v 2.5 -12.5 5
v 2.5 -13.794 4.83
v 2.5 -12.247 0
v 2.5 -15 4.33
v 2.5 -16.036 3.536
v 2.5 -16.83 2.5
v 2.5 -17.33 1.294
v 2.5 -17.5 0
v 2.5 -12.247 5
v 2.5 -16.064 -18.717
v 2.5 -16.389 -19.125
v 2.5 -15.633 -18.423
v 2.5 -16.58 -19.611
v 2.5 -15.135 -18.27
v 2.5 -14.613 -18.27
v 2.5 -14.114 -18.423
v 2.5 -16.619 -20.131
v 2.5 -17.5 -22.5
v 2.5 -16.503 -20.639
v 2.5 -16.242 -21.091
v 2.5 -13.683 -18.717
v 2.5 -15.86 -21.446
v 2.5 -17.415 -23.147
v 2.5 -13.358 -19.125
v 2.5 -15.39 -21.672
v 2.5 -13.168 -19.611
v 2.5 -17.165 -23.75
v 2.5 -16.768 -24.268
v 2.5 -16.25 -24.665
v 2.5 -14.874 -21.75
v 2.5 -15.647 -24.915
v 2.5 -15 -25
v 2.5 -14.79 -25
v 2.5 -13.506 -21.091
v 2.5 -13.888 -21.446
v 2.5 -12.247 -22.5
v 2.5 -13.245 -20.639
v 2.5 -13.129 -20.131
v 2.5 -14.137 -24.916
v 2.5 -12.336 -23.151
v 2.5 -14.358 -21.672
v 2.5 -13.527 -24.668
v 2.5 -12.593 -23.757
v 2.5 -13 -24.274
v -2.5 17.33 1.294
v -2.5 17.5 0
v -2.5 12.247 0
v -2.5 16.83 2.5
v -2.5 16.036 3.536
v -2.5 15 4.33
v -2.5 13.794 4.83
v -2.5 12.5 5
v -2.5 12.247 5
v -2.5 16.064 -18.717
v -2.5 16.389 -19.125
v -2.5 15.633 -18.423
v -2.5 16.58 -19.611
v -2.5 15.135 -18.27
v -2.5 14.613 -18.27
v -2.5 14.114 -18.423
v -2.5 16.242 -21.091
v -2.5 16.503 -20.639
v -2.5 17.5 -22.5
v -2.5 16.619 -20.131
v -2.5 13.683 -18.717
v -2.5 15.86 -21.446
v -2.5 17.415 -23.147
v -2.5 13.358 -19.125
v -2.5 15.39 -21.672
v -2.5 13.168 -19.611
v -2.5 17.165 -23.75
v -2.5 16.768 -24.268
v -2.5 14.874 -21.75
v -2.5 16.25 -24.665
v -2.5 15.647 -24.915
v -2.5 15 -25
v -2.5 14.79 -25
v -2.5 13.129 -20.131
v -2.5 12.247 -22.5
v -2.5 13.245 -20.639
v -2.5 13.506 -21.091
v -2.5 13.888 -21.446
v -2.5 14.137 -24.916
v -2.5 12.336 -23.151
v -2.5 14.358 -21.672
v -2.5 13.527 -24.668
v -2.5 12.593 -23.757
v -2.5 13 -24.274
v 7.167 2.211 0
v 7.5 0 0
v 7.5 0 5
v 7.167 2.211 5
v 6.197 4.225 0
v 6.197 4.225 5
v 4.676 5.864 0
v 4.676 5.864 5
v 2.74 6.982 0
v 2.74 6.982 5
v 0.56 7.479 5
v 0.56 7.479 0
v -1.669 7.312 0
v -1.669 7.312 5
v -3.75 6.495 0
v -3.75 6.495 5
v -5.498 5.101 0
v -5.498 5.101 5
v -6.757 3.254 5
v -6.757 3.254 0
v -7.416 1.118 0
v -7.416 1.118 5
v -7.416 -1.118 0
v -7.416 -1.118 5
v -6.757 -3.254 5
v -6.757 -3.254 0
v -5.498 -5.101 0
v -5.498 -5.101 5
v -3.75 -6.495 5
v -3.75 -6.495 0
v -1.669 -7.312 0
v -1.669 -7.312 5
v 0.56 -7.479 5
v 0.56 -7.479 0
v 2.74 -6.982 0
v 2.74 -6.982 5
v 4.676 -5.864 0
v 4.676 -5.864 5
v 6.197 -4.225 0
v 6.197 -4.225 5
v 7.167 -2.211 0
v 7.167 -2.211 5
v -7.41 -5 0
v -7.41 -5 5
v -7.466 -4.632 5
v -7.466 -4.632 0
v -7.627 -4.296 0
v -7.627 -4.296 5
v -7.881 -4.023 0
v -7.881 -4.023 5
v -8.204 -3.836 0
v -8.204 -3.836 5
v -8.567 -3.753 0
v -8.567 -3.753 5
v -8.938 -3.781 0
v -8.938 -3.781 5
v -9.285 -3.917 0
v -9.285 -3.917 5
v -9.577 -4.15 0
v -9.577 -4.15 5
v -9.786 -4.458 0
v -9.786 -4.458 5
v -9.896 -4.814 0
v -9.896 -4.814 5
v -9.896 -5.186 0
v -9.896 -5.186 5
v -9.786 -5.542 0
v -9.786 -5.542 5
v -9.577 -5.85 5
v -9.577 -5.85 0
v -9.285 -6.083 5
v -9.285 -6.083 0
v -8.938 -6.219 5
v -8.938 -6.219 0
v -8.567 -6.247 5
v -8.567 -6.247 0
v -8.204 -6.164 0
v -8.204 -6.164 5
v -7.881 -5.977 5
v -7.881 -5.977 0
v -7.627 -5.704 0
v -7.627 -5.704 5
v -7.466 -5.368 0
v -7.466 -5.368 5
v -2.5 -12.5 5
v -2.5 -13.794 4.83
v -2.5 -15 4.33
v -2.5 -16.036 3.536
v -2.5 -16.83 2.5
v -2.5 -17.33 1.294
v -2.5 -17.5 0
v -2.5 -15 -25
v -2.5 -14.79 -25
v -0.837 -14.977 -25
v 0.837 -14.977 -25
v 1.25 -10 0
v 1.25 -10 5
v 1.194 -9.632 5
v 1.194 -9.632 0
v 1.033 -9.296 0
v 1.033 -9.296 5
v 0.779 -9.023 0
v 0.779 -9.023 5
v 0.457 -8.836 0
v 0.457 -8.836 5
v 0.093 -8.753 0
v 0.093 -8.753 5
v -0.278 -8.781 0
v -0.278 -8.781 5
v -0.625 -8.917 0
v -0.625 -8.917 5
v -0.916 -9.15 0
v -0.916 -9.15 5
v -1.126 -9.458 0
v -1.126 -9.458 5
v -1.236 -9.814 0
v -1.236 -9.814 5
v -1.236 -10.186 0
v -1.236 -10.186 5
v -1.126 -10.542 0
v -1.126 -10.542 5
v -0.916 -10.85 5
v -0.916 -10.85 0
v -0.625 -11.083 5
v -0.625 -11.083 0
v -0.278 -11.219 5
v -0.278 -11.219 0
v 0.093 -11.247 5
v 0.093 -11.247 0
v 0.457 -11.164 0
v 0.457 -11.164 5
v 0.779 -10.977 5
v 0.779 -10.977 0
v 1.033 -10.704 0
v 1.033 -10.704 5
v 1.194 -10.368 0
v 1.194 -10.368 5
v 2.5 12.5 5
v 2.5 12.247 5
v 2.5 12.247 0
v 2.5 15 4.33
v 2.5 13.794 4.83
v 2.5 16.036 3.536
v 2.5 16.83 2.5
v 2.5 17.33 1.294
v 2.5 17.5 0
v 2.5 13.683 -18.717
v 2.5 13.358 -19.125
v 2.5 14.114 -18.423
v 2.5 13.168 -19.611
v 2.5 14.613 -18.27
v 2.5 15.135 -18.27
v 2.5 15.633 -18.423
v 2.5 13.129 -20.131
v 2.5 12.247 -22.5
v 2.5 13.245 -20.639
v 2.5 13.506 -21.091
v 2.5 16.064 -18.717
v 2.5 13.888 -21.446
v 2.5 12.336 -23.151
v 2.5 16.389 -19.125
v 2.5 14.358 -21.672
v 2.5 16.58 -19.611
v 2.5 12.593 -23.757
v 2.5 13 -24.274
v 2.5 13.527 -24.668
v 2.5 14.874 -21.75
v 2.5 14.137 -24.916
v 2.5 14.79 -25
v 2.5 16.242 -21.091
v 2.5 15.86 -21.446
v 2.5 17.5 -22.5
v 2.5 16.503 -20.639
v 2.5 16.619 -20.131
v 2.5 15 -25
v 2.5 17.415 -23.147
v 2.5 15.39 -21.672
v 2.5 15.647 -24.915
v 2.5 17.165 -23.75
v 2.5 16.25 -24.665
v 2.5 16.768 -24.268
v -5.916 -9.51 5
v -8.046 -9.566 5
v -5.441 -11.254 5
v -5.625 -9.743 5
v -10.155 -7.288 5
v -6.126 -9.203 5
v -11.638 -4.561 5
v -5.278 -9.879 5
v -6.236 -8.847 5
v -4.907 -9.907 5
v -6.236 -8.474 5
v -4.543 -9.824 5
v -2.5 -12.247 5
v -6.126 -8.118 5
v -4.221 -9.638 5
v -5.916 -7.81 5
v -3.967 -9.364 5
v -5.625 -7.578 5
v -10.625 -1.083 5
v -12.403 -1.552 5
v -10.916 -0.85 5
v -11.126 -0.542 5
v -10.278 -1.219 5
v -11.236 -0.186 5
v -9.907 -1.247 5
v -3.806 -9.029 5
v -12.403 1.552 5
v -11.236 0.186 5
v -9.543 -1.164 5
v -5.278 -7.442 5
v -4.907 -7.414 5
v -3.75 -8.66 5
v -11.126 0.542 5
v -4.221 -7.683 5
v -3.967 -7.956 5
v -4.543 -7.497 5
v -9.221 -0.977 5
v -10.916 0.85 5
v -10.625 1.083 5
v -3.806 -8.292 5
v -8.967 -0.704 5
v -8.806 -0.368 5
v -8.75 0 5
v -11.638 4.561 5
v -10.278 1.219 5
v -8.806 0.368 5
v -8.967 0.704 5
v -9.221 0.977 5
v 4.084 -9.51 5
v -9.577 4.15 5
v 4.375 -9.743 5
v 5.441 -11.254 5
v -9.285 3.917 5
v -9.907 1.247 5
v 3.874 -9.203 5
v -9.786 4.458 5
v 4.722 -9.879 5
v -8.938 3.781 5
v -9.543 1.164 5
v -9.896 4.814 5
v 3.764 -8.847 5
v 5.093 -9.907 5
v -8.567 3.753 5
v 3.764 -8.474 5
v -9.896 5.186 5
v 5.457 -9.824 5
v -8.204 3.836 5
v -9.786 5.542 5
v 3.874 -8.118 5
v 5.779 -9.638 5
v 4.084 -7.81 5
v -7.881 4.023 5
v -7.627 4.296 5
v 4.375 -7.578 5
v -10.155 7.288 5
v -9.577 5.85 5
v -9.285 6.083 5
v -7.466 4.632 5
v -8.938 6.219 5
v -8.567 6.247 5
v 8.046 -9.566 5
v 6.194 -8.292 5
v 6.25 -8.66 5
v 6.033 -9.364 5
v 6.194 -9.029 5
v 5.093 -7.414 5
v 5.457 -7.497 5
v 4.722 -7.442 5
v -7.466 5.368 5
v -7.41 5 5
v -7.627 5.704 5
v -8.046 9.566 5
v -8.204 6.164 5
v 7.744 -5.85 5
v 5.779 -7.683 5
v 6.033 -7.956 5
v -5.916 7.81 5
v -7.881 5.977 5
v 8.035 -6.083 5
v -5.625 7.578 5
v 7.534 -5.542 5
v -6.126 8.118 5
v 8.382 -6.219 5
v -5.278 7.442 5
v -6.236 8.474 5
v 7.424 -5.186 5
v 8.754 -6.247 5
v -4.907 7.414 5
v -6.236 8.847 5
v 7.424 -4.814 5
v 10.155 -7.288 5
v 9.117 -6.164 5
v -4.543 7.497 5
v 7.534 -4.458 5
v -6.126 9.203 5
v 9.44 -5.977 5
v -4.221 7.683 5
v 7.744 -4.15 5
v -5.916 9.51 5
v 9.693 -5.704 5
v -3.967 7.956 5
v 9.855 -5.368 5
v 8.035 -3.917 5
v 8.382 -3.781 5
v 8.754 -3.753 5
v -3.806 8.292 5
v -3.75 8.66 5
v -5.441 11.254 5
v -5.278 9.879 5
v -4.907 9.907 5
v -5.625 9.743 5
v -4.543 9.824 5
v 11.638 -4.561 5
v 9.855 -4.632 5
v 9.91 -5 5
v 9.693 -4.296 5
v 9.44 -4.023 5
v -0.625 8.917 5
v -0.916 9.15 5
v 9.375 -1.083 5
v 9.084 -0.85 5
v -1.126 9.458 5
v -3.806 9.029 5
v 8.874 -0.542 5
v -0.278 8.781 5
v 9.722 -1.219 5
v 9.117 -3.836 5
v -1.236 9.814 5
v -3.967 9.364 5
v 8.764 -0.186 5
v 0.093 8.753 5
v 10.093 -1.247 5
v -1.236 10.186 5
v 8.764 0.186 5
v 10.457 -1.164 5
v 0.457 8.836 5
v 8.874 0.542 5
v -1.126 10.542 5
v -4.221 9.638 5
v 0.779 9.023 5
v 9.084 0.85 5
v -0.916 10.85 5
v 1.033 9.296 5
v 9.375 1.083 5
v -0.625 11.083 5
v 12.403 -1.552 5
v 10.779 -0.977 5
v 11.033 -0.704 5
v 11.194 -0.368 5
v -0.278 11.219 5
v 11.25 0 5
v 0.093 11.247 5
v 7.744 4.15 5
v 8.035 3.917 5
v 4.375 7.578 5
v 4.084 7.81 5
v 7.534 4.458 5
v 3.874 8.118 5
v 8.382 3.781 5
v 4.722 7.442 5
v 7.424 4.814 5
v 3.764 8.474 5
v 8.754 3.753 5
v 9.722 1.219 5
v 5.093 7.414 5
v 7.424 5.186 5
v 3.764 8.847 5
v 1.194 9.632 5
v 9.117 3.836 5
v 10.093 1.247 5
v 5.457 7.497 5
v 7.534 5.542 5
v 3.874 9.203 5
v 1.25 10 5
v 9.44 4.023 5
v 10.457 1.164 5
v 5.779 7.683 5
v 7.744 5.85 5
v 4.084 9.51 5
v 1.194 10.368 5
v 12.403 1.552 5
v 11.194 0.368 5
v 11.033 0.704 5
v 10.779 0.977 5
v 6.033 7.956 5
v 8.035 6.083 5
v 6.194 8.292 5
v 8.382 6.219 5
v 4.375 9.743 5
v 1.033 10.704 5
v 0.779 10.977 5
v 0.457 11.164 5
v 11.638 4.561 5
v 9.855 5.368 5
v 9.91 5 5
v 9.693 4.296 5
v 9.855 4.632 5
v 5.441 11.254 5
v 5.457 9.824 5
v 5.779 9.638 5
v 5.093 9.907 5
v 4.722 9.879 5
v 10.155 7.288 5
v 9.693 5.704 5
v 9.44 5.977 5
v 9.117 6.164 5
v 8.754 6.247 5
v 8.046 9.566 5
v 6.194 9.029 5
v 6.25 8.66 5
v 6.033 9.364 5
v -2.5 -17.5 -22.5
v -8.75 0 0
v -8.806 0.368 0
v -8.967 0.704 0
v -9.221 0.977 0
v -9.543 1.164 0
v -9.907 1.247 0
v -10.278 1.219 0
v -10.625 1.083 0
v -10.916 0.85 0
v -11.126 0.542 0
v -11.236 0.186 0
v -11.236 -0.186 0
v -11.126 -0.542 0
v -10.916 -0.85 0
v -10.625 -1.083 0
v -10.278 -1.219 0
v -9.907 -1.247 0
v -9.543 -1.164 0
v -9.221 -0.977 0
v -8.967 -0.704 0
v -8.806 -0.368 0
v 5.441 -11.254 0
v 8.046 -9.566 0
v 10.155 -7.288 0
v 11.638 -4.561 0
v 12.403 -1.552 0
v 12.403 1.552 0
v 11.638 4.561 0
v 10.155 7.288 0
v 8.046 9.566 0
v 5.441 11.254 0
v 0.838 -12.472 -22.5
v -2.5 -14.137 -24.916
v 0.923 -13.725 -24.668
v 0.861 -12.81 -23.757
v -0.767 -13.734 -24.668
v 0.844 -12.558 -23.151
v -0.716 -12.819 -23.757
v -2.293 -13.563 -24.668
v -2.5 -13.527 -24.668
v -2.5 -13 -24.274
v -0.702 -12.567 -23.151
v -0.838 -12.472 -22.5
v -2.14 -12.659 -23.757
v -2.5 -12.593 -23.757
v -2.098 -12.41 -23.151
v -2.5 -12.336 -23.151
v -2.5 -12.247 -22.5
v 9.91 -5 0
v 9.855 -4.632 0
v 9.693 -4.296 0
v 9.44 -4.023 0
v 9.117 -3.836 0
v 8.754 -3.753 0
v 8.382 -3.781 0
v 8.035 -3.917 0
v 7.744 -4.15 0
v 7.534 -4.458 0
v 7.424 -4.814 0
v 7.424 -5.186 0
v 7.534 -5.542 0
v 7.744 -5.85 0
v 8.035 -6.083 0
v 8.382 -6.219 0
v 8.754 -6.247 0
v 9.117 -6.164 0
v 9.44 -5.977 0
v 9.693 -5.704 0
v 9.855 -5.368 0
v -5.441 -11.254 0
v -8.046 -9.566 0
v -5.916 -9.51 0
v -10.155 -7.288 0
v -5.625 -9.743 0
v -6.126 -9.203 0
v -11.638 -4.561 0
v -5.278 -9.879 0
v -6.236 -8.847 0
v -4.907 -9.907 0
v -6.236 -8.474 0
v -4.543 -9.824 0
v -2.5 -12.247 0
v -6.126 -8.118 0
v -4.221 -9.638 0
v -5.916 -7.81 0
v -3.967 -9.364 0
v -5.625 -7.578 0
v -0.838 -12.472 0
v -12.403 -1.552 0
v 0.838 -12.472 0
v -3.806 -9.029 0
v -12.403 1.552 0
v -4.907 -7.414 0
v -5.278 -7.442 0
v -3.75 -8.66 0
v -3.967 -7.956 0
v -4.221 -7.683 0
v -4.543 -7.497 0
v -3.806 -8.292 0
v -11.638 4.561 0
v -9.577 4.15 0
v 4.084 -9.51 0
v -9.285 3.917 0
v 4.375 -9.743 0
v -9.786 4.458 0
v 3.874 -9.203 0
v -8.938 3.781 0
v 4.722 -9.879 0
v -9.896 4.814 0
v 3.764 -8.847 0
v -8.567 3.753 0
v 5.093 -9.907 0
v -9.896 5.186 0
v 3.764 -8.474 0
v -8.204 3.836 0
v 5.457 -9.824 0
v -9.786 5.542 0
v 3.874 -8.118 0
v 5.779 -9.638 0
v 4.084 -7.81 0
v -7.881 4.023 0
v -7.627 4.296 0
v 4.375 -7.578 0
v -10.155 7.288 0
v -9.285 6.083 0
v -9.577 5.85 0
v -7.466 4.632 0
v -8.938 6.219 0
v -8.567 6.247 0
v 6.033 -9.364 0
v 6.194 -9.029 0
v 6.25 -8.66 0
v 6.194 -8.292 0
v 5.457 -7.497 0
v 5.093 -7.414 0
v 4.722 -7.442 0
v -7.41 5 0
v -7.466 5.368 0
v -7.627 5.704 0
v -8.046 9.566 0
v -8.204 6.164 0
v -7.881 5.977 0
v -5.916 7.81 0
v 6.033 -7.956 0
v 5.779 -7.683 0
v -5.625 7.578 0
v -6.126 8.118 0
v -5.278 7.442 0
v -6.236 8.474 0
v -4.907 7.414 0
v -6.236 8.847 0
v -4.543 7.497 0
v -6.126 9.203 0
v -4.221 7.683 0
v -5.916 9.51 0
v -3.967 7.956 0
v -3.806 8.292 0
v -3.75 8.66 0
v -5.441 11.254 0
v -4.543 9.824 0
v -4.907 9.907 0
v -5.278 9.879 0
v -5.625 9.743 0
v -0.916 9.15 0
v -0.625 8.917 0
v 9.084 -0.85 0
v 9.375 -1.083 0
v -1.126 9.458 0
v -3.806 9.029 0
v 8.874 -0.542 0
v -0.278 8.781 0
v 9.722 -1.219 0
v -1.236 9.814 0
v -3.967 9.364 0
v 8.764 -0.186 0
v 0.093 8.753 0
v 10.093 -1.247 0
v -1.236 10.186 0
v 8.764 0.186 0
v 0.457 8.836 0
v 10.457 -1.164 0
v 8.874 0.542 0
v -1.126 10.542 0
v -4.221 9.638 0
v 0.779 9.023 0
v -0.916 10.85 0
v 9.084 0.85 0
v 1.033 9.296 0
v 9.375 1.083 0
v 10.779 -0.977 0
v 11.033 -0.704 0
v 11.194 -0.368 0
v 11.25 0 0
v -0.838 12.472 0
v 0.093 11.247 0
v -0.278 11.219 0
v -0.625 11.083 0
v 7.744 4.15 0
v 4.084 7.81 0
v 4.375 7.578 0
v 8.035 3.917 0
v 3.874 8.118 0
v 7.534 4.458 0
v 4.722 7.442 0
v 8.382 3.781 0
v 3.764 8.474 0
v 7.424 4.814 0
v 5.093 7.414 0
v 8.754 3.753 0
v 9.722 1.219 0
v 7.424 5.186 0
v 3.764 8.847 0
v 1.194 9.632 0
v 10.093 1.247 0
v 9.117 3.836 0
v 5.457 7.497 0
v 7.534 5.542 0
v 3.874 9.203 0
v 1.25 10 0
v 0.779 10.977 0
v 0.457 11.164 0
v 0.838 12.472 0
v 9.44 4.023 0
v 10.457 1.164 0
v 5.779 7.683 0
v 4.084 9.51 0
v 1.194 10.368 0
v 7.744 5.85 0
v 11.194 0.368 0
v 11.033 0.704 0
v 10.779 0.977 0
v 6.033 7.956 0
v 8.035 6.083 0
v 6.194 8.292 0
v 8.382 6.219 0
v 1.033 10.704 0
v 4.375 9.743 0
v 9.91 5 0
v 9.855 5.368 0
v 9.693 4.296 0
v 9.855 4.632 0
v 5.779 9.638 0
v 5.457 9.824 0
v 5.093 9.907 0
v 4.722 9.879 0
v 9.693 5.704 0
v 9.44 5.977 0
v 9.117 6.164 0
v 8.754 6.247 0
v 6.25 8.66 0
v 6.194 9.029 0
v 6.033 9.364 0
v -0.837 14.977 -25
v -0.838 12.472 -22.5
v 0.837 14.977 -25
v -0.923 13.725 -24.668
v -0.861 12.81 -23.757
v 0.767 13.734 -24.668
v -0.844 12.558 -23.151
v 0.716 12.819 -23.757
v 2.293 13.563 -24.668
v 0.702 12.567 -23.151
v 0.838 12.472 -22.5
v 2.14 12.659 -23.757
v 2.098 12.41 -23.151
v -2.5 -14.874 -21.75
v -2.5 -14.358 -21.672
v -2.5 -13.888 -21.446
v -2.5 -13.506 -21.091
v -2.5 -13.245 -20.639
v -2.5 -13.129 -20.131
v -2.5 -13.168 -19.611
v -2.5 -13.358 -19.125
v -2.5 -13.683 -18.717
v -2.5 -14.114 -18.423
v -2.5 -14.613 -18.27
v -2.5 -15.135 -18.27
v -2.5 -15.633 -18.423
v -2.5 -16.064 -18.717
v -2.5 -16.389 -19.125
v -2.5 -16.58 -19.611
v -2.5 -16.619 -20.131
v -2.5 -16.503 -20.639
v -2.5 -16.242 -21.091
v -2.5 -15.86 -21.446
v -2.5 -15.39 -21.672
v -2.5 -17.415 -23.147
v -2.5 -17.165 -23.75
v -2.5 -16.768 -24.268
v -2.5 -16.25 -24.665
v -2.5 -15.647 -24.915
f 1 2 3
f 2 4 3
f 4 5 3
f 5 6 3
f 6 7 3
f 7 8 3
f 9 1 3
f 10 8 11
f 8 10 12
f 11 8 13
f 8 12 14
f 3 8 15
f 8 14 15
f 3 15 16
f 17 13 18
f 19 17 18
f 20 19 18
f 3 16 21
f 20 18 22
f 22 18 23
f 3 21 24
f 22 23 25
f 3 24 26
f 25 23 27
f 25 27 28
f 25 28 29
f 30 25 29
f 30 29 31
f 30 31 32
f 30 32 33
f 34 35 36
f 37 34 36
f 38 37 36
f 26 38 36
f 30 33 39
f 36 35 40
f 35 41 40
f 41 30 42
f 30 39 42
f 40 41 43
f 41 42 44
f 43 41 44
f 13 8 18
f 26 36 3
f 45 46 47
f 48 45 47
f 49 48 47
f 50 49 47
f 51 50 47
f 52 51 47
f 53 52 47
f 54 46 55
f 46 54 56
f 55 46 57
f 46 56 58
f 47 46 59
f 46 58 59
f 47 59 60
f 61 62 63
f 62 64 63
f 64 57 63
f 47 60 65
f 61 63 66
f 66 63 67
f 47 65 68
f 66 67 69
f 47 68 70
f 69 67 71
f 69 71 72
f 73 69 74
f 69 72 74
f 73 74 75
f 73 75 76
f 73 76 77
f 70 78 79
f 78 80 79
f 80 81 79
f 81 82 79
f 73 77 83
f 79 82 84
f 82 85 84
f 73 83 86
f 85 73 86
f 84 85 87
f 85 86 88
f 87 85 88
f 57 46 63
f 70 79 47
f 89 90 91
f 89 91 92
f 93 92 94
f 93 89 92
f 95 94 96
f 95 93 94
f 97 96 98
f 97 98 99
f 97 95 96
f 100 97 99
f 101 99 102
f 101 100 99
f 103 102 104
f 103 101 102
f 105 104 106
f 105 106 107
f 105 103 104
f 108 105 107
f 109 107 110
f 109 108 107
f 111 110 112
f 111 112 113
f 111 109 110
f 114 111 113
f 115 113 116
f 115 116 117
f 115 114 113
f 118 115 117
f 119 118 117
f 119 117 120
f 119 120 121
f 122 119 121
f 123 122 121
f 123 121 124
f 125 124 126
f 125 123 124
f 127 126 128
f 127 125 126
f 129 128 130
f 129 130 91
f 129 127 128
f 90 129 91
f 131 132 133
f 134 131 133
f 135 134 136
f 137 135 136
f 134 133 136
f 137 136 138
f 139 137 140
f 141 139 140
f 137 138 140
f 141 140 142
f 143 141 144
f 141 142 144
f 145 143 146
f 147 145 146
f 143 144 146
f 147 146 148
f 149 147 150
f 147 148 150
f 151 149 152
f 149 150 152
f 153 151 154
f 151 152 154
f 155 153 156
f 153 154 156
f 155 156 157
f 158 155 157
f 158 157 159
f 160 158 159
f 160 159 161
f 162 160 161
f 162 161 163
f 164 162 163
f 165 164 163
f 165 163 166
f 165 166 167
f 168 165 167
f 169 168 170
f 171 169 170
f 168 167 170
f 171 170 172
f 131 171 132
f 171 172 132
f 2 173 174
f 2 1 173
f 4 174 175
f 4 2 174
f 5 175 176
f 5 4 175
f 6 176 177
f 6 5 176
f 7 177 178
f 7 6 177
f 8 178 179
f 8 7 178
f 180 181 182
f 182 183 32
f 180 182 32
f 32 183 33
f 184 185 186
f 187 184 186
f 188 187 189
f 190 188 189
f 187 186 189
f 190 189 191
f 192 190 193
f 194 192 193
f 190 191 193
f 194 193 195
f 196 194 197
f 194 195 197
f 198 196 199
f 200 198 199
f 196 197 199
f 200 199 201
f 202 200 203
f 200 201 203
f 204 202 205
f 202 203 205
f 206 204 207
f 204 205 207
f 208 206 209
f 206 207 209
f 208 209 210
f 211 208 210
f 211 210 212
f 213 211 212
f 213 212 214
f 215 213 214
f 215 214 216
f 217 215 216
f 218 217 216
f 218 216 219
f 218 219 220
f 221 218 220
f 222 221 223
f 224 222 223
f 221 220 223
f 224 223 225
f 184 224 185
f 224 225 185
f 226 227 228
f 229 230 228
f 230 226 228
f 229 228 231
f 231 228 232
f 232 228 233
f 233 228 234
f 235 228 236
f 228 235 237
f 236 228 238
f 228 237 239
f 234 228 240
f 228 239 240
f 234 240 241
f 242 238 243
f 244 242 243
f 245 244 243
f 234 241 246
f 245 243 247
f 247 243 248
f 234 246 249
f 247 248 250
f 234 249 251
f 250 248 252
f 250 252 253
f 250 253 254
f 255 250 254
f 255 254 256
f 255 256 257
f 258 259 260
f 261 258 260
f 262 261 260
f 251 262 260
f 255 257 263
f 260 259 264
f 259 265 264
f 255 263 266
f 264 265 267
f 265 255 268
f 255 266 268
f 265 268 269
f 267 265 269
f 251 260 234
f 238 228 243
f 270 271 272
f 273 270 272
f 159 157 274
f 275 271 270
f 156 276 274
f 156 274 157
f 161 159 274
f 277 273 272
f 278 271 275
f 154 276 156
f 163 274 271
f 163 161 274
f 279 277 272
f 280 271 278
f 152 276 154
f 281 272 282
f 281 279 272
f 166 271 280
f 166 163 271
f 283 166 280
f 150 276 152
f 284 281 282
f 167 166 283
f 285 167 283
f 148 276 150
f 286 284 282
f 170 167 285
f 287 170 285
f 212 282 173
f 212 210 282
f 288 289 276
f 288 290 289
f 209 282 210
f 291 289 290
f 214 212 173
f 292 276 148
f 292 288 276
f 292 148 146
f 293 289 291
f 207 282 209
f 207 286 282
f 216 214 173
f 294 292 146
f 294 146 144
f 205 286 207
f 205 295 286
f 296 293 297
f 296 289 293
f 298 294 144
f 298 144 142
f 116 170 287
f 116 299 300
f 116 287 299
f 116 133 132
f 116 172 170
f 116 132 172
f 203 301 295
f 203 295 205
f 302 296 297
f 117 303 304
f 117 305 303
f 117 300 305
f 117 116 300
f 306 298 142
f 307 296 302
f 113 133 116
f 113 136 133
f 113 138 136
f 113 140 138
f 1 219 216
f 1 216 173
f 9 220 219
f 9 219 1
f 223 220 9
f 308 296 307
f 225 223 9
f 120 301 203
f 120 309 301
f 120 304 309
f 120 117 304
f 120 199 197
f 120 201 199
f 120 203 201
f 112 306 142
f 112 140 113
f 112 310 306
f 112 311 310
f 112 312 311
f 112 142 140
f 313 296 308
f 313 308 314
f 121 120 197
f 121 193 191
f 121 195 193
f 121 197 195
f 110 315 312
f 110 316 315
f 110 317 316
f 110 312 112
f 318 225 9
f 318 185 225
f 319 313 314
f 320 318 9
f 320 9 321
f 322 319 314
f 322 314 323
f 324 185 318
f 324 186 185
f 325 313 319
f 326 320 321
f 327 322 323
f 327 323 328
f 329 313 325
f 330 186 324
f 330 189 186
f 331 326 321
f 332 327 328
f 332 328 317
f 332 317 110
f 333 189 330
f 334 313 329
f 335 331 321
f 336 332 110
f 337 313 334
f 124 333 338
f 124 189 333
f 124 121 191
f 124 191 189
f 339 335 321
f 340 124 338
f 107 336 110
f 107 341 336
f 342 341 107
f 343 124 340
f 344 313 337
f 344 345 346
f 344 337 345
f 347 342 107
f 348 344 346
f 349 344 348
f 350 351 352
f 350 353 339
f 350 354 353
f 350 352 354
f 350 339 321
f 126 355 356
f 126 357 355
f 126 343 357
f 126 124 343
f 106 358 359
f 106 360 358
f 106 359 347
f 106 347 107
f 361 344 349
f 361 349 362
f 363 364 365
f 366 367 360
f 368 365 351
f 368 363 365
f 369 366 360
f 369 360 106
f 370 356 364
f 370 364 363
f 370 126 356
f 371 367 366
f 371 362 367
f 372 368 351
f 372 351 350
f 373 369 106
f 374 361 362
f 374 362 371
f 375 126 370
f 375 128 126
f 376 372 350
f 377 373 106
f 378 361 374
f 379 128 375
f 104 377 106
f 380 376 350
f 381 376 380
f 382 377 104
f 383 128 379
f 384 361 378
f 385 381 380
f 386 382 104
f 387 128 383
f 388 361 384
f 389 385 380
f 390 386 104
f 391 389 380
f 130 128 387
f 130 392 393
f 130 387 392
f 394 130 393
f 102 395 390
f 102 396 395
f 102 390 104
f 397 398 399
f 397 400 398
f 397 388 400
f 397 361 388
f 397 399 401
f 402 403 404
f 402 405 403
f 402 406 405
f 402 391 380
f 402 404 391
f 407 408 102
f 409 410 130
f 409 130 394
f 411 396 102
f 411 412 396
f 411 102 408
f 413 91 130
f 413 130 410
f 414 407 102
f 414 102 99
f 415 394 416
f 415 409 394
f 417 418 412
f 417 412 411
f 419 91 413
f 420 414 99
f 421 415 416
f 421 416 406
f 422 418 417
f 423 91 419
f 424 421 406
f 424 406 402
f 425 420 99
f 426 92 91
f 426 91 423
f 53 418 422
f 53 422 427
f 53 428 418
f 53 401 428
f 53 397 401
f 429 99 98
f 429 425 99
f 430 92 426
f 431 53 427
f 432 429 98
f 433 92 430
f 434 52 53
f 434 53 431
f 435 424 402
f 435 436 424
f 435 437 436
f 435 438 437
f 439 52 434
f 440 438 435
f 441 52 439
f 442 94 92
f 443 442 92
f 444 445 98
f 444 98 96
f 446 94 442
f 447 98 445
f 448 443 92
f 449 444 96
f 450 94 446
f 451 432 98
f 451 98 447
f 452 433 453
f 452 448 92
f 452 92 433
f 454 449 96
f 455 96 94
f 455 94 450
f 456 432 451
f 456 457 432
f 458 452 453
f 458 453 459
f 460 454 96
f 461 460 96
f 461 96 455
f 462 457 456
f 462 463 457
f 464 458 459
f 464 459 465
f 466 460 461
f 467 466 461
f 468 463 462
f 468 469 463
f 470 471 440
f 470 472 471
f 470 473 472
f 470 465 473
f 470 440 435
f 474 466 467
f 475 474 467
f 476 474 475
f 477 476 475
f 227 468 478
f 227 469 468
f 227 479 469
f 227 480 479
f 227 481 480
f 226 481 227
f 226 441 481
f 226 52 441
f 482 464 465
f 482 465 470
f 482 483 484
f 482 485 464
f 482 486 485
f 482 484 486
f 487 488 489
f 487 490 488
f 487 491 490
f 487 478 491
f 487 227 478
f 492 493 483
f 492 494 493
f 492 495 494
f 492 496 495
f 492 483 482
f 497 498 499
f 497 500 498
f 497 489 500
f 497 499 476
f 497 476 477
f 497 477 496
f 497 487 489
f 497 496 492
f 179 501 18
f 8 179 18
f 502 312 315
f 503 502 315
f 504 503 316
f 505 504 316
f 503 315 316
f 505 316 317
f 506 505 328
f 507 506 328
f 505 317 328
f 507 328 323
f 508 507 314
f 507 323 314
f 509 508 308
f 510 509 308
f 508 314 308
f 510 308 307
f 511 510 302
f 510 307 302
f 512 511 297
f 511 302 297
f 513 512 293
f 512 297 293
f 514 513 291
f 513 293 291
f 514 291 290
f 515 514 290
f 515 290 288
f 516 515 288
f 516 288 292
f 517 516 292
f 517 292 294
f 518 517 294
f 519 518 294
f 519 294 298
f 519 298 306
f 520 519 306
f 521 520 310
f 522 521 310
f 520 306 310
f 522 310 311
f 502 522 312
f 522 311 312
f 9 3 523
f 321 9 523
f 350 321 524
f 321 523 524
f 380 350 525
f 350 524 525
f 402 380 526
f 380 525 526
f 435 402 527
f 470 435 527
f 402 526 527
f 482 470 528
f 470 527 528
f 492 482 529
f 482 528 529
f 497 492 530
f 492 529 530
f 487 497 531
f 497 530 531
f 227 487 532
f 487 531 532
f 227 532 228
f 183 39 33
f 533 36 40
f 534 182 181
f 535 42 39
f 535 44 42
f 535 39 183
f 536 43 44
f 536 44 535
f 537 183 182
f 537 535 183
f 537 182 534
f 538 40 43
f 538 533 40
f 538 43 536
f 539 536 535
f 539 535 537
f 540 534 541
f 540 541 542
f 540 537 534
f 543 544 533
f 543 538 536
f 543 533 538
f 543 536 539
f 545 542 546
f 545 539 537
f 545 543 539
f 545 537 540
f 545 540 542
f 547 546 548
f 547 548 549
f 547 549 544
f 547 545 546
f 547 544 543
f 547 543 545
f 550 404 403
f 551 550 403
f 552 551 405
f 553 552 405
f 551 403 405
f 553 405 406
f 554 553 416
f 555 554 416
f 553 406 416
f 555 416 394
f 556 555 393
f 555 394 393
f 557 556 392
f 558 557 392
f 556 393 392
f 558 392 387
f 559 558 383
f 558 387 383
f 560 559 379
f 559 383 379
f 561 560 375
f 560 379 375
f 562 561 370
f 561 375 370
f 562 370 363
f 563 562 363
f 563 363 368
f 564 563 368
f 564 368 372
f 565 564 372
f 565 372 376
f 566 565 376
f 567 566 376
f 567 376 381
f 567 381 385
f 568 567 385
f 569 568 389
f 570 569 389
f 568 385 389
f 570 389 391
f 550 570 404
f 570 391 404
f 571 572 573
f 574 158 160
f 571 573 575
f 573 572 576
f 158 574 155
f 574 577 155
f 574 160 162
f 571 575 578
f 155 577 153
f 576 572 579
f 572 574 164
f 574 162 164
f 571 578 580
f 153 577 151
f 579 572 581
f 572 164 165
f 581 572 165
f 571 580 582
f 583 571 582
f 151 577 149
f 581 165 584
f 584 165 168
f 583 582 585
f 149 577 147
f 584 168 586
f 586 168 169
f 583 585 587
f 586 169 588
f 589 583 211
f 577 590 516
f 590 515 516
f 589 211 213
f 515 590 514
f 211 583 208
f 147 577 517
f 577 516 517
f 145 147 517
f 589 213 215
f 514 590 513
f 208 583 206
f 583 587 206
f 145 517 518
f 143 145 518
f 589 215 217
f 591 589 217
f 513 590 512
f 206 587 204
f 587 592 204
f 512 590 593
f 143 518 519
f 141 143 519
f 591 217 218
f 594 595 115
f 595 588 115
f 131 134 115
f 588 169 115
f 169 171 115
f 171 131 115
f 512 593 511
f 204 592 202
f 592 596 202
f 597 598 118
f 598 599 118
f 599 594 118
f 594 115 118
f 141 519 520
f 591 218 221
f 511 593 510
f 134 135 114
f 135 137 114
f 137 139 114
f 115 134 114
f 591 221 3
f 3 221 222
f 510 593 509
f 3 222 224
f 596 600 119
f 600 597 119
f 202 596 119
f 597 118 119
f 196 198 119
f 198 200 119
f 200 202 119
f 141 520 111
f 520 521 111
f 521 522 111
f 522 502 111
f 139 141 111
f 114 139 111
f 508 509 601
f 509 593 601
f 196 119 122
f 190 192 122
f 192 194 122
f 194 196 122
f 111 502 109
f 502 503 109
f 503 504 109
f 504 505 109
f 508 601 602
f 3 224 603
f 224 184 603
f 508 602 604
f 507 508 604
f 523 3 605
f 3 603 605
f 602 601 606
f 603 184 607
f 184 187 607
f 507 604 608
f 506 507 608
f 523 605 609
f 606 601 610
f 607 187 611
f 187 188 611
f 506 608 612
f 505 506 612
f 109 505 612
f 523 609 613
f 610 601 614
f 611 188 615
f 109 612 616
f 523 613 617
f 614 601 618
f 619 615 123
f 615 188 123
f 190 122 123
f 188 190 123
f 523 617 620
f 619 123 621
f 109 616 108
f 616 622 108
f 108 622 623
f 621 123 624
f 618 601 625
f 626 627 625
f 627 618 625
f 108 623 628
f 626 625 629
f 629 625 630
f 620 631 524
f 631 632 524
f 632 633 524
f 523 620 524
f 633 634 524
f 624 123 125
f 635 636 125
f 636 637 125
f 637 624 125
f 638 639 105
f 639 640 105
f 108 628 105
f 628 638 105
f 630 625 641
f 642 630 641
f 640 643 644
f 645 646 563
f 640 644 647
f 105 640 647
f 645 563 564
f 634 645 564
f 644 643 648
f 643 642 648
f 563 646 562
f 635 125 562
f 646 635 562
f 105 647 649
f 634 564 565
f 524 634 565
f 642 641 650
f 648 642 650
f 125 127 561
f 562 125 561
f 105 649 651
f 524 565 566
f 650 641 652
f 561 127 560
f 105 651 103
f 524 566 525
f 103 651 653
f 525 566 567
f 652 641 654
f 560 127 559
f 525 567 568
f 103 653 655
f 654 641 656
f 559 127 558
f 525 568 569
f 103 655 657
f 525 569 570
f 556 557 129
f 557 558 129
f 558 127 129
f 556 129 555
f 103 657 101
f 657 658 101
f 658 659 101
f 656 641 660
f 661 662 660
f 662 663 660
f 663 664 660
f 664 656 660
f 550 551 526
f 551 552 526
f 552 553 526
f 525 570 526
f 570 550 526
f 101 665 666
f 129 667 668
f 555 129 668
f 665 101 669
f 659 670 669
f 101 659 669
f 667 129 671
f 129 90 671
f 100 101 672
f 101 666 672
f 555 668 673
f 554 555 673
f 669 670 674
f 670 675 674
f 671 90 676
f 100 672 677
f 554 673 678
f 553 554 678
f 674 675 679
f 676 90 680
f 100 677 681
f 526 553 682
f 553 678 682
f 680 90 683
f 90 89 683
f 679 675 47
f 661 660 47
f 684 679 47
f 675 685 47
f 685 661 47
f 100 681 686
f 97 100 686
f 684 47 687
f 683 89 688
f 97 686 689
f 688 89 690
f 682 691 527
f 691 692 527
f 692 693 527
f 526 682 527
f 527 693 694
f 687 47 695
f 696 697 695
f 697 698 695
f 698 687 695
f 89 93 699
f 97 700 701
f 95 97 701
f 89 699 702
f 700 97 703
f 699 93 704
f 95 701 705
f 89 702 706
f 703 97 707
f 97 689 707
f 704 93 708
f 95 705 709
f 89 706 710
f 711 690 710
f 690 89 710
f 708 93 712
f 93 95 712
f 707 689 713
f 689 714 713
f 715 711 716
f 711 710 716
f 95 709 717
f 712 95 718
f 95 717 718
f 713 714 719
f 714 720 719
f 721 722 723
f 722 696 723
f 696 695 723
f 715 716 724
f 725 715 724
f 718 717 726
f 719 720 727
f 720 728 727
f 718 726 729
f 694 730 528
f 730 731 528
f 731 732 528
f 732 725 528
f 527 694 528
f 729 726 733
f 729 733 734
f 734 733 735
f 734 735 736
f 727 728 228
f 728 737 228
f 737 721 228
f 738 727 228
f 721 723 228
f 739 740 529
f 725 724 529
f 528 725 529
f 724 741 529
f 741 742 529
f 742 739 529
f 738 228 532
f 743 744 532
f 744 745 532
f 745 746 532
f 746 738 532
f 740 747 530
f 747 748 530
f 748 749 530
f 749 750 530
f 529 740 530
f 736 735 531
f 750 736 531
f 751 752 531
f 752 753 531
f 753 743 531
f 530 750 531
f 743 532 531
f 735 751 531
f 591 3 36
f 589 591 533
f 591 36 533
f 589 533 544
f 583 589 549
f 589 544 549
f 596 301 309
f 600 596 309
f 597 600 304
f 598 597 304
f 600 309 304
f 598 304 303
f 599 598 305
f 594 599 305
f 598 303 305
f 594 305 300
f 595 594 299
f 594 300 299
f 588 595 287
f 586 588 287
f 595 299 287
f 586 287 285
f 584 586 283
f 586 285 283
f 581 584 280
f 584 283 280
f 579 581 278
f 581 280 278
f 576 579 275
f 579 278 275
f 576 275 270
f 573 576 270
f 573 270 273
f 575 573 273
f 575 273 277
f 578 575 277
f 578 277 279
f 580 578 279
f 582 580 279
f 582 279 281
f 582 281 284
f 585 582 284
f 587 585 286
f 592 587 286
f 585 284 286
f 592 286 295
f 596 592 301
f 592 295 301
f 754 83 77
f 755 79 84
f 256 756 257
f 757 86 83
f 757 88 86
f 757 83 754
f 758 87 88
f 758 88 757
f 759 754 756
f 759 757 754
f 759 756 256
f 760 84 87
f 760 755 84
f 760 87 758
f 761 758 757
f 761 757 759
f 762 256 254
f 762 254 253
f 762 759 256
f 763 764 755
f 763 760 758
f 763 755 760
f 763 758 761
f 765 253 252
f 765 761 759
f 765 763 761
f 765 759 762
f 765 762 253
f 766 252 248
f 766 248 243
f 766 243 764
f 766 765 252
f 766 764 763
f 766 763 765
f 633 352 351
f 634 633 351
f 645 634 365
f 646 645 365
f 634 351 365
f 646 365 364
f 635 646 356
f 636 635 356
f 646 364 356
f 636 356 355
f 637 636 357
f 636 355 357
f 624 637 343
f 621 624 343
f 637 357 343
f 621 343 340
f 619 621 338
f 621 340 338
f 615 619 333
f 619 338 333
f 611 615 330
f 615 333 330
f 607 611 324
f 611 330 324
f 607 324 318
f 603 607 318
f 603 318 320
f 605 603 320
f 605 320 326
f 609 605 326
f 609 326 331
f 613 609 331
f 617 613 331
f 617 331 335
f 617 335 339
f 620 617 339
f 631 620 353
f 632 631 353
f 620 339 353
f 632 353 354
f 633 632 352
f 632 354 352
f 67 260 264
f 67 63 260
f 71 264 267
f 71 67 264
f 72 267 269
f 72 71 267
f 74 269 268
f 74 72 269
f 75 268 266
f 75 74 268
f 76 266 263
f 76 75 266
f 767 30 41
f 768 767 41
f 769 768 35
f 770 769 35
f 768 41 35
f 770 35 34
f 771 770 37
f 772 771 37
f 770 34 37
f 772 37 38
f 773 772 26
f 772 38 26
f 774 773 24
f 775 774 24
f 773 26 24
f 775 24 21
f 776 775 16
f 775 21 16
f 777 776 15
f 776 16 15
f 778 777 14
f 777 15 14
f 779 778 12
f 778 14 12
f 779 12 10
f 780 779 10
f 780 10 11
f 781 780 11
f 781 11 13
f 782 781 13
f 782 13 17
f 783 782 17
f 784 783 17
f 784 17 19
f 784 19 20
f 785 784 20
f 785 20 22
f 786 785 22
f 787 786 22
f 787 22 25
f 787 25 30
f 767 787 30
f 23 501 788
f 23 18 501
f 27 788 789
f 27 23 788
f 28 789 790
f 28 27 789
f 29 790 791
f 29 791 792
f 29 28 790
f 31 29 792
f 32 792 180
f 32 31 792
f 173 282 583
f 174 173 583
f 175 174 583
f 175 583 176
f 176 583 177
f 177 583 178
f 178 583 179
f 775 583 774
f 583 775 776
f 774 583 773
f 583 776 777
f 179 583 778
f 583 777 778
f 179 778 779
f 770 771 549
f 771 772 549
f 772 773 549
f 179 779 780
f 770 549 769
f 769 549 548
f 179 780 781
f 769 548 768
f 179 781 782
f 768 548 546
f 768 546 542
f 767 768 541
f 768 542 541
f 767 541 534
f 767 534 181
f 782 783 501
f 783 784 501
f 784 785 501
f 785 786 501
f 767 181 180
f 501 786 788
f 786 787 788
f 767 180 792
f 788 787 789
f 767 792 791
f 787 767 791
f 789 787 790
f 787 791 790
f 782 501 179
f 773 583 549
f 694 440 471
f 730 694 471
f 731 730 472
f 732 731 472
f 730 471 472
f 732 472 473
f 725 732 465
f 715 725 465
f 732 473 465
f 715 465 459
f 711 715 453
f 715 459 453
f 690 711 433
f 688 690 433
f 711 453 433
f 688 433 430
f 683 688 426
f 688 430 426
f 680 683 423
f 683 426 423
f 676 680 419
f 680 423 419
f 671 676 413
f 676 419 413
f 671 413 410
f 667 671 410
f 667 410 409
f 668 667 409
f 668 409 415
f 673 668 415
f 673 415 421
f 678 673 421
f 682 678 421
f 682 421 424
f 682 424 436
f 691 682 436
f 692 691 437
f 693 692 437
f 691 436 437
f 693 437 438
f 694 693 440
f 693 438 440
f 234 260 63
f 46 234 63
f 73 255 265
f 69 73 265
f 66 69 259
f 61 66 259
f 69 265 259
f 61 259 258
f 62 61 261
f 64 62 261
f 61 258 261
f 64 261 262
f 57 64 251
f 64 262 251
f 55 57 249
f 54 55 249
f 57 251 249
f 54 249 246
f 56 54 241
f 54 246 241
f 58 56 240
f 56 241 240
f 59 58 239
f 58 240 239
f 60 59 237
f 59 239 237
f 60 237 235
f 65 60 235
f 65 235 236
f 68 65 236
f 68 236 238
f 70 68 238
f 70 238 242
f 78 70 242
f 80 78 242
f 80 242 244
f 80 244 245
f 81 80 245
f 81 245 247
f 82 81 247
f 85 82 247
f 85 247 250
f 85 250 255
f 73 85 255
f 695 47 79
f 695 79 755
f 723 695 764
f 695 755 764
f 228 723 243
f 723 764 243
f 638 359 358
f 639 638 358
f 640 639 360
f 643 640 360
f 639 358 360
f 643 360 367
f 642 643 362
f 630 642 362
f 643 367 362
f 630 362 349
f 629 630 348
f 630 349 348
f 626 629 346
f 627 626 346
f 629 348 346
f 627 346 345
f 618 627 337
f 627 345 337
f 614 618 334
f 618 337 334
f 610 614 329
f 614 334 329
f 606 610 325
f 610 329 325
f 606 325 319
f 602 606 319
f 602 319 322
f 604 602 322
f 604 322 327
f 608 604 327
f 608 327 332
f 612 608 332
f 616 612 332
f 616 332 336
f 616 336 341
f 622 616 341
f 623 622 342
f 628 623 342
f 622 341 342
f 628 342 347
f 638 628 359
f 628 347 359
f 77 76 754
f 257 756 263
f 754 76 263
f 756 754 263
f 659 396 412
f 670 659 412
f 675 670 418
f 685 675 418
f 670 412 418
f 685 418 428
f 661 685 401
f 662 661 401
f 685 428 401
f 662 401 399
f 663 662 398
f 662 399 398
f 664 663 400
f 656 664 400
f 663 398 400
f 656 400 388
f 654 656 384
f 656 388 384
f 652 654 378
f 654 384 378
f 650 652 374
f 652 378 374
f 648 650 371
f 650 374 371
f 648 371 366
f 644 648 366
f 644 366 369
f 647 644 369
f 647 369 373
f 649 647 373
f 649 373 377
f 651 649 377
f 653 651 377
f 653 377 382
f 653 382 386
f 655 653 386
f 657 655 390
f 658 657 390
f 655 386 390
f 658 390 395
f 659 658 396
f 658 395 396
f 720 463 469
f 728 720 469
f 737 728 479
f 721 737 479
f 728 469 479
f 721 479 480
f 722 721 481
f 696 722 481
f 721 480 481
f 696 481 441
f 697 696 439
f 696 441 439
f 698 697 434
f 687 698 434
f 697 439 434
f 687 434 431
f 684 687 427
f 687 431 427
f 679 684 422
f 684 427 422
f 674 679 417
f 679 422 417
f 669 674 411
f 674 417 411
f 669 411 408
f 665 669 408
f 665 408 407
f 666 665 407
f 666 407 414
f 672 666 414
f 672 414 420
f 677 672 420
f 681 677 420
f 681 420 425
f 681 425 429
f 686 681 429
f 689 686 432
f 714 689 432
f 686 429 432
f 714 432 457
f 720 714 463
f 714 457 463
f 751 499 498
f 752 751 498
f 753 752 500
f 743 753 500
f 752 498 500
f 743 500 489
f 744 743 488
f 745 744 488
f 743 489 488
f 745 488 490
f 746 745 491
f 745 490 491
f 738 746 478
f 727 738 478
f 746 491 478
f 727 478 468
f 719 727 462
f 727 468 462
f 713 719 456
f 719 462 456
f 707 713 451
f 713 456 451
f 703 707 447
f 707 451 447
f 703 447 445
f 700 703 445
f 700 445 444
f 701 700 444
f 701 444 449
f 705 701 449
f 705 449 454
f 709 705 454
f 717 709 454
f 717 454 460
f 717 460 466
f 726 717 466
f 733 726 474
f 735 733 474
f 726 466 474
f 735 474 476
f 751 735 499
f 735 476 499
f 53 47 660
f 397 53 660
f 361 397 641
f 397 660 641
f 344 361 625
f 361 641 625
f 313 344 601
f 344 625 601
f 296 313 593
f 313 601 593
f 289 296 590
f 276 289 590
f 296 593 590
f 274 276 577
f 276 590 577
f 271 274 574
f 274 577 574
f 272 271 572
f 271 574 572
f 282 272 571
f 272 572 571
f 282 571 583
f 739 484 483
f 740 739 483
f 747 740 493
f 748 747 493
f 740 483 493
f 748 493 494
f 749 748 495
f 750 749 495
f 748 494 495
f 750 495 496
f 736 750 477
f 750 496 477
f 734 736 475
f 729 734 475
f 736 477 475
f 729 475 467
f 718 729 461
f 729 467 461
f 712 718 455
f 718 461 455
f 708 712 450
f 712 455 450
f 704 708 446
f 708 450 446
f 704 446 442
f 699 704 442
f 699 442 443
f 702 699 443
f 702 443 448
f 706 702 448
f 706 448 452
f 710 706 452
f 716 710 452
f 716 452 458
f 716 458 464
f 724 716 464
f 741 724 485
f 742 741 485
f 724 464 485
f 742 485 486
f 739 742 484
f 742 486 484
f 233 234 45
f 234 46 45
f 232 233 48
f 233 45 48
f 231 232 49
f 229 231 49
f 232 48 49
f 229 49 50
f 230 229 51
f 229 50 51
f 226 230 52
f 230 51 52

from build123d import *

# Parameters (mm, degrees)
SKETCH1_R           = 12.5
SKETCH1_R_2         = 7.5
BOSS_EXTRUDE1_DEPTH = 5
SKETCH3_R           = 1.25
CUT_EXTRUDE1_DEPTH  = 5
BOSS_EXTRUDE2_START = -30
BOSS_EXTRUDE2_DEPTH = 30
SKETCH6_R           = 1.75
CUT_EXTRUDE2_DEPTH  = 35.003676272
FILLET1_R           = 5
FILLET2_R           = 2.5


with BuildPart() as part:
    # Sketch1 → Boss-Extrude1 (new body)
    with BuildSketch(Plane.XY):
        Circle(SKETCH1_R)
        Circle(SKETCH1_R_2, mode=Mode.SUBTRACT)
    extrude(amount=BOSS_EXTRUDE1_DEPTH)

    # Sketch3 → Cut-Extrude1 (cut)
    with BuildSketch(Plane.XY.offset(5)):
        with Locations((0, 10)):
            Circle(SKETCH3_R)
        with Locations((5, 8.660254038)):
            Circle(SKETCH3_R)
        with Locations((8.660254038, 5)):
            Circle(SKETCH3_R)
        with Locations((10, 0)):
            Circle(SKETCH3_R)
        with Locations((8.660254038, -5)):
            Circle(SKETCH3_R)
        with Locations((5, -8.660254038)):
            Circle(SKETCH3_R)
        with Locations((0, -10)):
            Circle(SKETCH3_R)
        with Locations((-5, -8.660254038)):
            Circle(SKETCH3_R)
        with Locations((-8.660254038, -5)):
            Circle(SKETCH3_R)
        with Locations((-10, 0)):
            Circle(SKETCH3_R)
        with Locations((-8.660254038, 5)):
            Circle(SKETCH3_R)
        with Locations((-5, 8.660254038)):
            Circle(SKETCH3_R)
    extrude(amount=-CUT_EXTRUDE1_DEPTH, mode=Mode.SUBTRACT)

    # Sketch4 → Boss-Extrude2 (add)
    with BuildSketch(Plane.XY.offset(5).offset(BOSS_EXTRUDE2_START)):
        with BuildLine():
            Line((-2.5, 17.5), (-2.5, 12.247448714))
            ThreePointArc((-2.5, 12.247448714), (0, 12.5), (2.5, 12.247448714))
            Line((2.5, 12.247448714), (2.5, 17.5))
            Line((2.5, 17.5), (-2.5, 17.5))
        make_face()
        with BuildLine():
            Line((-2.5, -12.247448714), (-2.5, -17.5))
            Line((-2.5, -17.5), (2.5, -17.5))
            Line((2.5, -17.5), (2.5, -12.247448714))
            ThreePointArc((2.5, -12.247448714), (0, -12.5), (-2.5, -12.247448714))
        make_face()
    extrude(amount=BOSS_EXTRUDE2_DEPTH)

    # Sketch6 → Cut-Extrude2 (cut, through all)
    with BuildSketch(Plane(origin=(2.5, 0, 0), x_dir=(0, 0, -1), z_dir=(1, 0, 0))):
        with Locations((20, 14.873724357)):
            Circle(SKETCH6_R)
        with Locations((20, -14.873724357)):
            Circle(SKETCH6_R)
    extrude(amount=-CUT_EXTRUDE2_DEPTH, mode=Mode.SUBTRACT)

    # Fillet1
    fillet1_edges = [part.edges().sort_by_distance(p)[0] for p in [
        (0, 17.5, 5),
        (0, -17.5, 5),
    ]]
    fillet(fillet1_edges, radius=FILLET1_R)

    # Fillet2
    fillet2_edges = [part.edges().sort_by_distance(p)[0] for p in [
        (0, 12.5, -25),
        (0, 17.5, -25),
        (0, -17.5, -25),
        (0, -12.5, -25),
    ]]
    fillet(fillet2_edges, radius=FILLET2_R - 0.0001)  # a hair under: the kernel refuses the full size


solid = part.part
